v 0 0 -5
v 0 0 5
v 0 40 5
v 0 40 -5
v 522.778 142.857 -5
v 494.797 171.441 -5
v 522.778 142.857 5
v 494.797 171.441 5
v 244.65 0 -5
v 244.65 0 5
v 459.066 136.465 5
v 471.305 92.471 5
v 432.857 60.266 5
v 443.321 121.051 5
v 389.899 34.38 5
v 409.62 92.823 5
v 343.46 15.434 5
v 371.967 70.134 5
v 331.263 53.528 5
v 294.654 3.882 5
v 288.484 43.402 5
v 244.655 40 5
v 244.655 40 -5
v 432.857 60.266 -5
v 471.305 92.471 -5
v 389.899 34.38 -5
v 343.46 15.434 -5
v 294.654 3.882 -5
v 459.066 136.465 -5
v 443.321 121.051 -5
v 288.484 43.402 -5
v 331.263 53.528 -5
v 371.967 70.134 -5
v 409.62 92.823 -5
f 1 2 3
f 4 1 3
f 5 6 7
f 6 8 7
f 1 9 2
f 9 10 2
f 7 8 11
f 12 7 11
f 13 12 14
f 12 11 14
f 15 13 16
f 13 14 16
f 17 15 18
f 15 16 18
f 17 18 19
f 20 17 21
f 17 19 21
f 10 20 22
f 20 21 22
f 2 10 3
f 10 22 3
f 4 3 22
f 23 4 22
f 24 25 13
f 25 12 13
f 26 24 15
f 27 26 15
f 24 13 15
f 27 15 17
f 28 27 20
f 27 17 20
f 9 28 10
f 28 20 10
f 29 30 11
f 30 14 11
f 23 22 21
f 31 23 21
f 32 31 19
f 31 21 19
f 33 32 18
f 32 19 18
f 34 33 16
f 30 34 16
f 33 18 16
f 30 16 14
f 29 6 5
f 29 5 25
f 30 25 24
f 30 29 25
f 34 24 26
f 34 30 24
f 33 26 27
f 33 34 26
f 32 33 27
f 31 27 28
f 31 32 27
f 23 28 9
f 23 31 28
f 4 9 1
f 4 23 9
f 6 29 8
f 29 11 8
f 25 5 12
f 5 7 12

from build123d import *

# Parameters (mm, degrees)
BOSS_EXTRUDE1_DEPTH = 5


with BuildPart() as part:
    # Sketch4 → Boss-Extrude1 (new, symmetric)
    with BuildSketch(Plane.XY):
        with BuildLine():
            Line((50, 40), (244.655381072, 40))
            ThreePointArc((244.655381072, 40), (351.936835728, 61.042418845), (443.320675573, 121.051482487))
            Line((443.320675573, 121.051482487), (459.066489093, 136.464981035))
            Line((459.066489093, 136.464981035), (494.796861895, 171.441265278))
            Line((494.796861895, 171.441265278), (522.777889288, 142.856967039))
            Line((522.777889288, 142.856967039), (487.047516486, 107.880682795))
            Line((487.047516486, 107.880682795), (471.305428262, 92.47083092))
            ThreePointArc((471.305428262, 92.47083092), (367.046513526, 24.007086549), (244.650168029, 0))
            Line((244.650168029, 0), (50, 0))
            Line((50, 0), (0, 0))
            Line((0, 0), (0, 40))
            Line((0, 40), (50, 40))
        make_face()
    extrude(amount=BOSS_EXTRUDE1_DEPTH, both=True)


solid = part.part
